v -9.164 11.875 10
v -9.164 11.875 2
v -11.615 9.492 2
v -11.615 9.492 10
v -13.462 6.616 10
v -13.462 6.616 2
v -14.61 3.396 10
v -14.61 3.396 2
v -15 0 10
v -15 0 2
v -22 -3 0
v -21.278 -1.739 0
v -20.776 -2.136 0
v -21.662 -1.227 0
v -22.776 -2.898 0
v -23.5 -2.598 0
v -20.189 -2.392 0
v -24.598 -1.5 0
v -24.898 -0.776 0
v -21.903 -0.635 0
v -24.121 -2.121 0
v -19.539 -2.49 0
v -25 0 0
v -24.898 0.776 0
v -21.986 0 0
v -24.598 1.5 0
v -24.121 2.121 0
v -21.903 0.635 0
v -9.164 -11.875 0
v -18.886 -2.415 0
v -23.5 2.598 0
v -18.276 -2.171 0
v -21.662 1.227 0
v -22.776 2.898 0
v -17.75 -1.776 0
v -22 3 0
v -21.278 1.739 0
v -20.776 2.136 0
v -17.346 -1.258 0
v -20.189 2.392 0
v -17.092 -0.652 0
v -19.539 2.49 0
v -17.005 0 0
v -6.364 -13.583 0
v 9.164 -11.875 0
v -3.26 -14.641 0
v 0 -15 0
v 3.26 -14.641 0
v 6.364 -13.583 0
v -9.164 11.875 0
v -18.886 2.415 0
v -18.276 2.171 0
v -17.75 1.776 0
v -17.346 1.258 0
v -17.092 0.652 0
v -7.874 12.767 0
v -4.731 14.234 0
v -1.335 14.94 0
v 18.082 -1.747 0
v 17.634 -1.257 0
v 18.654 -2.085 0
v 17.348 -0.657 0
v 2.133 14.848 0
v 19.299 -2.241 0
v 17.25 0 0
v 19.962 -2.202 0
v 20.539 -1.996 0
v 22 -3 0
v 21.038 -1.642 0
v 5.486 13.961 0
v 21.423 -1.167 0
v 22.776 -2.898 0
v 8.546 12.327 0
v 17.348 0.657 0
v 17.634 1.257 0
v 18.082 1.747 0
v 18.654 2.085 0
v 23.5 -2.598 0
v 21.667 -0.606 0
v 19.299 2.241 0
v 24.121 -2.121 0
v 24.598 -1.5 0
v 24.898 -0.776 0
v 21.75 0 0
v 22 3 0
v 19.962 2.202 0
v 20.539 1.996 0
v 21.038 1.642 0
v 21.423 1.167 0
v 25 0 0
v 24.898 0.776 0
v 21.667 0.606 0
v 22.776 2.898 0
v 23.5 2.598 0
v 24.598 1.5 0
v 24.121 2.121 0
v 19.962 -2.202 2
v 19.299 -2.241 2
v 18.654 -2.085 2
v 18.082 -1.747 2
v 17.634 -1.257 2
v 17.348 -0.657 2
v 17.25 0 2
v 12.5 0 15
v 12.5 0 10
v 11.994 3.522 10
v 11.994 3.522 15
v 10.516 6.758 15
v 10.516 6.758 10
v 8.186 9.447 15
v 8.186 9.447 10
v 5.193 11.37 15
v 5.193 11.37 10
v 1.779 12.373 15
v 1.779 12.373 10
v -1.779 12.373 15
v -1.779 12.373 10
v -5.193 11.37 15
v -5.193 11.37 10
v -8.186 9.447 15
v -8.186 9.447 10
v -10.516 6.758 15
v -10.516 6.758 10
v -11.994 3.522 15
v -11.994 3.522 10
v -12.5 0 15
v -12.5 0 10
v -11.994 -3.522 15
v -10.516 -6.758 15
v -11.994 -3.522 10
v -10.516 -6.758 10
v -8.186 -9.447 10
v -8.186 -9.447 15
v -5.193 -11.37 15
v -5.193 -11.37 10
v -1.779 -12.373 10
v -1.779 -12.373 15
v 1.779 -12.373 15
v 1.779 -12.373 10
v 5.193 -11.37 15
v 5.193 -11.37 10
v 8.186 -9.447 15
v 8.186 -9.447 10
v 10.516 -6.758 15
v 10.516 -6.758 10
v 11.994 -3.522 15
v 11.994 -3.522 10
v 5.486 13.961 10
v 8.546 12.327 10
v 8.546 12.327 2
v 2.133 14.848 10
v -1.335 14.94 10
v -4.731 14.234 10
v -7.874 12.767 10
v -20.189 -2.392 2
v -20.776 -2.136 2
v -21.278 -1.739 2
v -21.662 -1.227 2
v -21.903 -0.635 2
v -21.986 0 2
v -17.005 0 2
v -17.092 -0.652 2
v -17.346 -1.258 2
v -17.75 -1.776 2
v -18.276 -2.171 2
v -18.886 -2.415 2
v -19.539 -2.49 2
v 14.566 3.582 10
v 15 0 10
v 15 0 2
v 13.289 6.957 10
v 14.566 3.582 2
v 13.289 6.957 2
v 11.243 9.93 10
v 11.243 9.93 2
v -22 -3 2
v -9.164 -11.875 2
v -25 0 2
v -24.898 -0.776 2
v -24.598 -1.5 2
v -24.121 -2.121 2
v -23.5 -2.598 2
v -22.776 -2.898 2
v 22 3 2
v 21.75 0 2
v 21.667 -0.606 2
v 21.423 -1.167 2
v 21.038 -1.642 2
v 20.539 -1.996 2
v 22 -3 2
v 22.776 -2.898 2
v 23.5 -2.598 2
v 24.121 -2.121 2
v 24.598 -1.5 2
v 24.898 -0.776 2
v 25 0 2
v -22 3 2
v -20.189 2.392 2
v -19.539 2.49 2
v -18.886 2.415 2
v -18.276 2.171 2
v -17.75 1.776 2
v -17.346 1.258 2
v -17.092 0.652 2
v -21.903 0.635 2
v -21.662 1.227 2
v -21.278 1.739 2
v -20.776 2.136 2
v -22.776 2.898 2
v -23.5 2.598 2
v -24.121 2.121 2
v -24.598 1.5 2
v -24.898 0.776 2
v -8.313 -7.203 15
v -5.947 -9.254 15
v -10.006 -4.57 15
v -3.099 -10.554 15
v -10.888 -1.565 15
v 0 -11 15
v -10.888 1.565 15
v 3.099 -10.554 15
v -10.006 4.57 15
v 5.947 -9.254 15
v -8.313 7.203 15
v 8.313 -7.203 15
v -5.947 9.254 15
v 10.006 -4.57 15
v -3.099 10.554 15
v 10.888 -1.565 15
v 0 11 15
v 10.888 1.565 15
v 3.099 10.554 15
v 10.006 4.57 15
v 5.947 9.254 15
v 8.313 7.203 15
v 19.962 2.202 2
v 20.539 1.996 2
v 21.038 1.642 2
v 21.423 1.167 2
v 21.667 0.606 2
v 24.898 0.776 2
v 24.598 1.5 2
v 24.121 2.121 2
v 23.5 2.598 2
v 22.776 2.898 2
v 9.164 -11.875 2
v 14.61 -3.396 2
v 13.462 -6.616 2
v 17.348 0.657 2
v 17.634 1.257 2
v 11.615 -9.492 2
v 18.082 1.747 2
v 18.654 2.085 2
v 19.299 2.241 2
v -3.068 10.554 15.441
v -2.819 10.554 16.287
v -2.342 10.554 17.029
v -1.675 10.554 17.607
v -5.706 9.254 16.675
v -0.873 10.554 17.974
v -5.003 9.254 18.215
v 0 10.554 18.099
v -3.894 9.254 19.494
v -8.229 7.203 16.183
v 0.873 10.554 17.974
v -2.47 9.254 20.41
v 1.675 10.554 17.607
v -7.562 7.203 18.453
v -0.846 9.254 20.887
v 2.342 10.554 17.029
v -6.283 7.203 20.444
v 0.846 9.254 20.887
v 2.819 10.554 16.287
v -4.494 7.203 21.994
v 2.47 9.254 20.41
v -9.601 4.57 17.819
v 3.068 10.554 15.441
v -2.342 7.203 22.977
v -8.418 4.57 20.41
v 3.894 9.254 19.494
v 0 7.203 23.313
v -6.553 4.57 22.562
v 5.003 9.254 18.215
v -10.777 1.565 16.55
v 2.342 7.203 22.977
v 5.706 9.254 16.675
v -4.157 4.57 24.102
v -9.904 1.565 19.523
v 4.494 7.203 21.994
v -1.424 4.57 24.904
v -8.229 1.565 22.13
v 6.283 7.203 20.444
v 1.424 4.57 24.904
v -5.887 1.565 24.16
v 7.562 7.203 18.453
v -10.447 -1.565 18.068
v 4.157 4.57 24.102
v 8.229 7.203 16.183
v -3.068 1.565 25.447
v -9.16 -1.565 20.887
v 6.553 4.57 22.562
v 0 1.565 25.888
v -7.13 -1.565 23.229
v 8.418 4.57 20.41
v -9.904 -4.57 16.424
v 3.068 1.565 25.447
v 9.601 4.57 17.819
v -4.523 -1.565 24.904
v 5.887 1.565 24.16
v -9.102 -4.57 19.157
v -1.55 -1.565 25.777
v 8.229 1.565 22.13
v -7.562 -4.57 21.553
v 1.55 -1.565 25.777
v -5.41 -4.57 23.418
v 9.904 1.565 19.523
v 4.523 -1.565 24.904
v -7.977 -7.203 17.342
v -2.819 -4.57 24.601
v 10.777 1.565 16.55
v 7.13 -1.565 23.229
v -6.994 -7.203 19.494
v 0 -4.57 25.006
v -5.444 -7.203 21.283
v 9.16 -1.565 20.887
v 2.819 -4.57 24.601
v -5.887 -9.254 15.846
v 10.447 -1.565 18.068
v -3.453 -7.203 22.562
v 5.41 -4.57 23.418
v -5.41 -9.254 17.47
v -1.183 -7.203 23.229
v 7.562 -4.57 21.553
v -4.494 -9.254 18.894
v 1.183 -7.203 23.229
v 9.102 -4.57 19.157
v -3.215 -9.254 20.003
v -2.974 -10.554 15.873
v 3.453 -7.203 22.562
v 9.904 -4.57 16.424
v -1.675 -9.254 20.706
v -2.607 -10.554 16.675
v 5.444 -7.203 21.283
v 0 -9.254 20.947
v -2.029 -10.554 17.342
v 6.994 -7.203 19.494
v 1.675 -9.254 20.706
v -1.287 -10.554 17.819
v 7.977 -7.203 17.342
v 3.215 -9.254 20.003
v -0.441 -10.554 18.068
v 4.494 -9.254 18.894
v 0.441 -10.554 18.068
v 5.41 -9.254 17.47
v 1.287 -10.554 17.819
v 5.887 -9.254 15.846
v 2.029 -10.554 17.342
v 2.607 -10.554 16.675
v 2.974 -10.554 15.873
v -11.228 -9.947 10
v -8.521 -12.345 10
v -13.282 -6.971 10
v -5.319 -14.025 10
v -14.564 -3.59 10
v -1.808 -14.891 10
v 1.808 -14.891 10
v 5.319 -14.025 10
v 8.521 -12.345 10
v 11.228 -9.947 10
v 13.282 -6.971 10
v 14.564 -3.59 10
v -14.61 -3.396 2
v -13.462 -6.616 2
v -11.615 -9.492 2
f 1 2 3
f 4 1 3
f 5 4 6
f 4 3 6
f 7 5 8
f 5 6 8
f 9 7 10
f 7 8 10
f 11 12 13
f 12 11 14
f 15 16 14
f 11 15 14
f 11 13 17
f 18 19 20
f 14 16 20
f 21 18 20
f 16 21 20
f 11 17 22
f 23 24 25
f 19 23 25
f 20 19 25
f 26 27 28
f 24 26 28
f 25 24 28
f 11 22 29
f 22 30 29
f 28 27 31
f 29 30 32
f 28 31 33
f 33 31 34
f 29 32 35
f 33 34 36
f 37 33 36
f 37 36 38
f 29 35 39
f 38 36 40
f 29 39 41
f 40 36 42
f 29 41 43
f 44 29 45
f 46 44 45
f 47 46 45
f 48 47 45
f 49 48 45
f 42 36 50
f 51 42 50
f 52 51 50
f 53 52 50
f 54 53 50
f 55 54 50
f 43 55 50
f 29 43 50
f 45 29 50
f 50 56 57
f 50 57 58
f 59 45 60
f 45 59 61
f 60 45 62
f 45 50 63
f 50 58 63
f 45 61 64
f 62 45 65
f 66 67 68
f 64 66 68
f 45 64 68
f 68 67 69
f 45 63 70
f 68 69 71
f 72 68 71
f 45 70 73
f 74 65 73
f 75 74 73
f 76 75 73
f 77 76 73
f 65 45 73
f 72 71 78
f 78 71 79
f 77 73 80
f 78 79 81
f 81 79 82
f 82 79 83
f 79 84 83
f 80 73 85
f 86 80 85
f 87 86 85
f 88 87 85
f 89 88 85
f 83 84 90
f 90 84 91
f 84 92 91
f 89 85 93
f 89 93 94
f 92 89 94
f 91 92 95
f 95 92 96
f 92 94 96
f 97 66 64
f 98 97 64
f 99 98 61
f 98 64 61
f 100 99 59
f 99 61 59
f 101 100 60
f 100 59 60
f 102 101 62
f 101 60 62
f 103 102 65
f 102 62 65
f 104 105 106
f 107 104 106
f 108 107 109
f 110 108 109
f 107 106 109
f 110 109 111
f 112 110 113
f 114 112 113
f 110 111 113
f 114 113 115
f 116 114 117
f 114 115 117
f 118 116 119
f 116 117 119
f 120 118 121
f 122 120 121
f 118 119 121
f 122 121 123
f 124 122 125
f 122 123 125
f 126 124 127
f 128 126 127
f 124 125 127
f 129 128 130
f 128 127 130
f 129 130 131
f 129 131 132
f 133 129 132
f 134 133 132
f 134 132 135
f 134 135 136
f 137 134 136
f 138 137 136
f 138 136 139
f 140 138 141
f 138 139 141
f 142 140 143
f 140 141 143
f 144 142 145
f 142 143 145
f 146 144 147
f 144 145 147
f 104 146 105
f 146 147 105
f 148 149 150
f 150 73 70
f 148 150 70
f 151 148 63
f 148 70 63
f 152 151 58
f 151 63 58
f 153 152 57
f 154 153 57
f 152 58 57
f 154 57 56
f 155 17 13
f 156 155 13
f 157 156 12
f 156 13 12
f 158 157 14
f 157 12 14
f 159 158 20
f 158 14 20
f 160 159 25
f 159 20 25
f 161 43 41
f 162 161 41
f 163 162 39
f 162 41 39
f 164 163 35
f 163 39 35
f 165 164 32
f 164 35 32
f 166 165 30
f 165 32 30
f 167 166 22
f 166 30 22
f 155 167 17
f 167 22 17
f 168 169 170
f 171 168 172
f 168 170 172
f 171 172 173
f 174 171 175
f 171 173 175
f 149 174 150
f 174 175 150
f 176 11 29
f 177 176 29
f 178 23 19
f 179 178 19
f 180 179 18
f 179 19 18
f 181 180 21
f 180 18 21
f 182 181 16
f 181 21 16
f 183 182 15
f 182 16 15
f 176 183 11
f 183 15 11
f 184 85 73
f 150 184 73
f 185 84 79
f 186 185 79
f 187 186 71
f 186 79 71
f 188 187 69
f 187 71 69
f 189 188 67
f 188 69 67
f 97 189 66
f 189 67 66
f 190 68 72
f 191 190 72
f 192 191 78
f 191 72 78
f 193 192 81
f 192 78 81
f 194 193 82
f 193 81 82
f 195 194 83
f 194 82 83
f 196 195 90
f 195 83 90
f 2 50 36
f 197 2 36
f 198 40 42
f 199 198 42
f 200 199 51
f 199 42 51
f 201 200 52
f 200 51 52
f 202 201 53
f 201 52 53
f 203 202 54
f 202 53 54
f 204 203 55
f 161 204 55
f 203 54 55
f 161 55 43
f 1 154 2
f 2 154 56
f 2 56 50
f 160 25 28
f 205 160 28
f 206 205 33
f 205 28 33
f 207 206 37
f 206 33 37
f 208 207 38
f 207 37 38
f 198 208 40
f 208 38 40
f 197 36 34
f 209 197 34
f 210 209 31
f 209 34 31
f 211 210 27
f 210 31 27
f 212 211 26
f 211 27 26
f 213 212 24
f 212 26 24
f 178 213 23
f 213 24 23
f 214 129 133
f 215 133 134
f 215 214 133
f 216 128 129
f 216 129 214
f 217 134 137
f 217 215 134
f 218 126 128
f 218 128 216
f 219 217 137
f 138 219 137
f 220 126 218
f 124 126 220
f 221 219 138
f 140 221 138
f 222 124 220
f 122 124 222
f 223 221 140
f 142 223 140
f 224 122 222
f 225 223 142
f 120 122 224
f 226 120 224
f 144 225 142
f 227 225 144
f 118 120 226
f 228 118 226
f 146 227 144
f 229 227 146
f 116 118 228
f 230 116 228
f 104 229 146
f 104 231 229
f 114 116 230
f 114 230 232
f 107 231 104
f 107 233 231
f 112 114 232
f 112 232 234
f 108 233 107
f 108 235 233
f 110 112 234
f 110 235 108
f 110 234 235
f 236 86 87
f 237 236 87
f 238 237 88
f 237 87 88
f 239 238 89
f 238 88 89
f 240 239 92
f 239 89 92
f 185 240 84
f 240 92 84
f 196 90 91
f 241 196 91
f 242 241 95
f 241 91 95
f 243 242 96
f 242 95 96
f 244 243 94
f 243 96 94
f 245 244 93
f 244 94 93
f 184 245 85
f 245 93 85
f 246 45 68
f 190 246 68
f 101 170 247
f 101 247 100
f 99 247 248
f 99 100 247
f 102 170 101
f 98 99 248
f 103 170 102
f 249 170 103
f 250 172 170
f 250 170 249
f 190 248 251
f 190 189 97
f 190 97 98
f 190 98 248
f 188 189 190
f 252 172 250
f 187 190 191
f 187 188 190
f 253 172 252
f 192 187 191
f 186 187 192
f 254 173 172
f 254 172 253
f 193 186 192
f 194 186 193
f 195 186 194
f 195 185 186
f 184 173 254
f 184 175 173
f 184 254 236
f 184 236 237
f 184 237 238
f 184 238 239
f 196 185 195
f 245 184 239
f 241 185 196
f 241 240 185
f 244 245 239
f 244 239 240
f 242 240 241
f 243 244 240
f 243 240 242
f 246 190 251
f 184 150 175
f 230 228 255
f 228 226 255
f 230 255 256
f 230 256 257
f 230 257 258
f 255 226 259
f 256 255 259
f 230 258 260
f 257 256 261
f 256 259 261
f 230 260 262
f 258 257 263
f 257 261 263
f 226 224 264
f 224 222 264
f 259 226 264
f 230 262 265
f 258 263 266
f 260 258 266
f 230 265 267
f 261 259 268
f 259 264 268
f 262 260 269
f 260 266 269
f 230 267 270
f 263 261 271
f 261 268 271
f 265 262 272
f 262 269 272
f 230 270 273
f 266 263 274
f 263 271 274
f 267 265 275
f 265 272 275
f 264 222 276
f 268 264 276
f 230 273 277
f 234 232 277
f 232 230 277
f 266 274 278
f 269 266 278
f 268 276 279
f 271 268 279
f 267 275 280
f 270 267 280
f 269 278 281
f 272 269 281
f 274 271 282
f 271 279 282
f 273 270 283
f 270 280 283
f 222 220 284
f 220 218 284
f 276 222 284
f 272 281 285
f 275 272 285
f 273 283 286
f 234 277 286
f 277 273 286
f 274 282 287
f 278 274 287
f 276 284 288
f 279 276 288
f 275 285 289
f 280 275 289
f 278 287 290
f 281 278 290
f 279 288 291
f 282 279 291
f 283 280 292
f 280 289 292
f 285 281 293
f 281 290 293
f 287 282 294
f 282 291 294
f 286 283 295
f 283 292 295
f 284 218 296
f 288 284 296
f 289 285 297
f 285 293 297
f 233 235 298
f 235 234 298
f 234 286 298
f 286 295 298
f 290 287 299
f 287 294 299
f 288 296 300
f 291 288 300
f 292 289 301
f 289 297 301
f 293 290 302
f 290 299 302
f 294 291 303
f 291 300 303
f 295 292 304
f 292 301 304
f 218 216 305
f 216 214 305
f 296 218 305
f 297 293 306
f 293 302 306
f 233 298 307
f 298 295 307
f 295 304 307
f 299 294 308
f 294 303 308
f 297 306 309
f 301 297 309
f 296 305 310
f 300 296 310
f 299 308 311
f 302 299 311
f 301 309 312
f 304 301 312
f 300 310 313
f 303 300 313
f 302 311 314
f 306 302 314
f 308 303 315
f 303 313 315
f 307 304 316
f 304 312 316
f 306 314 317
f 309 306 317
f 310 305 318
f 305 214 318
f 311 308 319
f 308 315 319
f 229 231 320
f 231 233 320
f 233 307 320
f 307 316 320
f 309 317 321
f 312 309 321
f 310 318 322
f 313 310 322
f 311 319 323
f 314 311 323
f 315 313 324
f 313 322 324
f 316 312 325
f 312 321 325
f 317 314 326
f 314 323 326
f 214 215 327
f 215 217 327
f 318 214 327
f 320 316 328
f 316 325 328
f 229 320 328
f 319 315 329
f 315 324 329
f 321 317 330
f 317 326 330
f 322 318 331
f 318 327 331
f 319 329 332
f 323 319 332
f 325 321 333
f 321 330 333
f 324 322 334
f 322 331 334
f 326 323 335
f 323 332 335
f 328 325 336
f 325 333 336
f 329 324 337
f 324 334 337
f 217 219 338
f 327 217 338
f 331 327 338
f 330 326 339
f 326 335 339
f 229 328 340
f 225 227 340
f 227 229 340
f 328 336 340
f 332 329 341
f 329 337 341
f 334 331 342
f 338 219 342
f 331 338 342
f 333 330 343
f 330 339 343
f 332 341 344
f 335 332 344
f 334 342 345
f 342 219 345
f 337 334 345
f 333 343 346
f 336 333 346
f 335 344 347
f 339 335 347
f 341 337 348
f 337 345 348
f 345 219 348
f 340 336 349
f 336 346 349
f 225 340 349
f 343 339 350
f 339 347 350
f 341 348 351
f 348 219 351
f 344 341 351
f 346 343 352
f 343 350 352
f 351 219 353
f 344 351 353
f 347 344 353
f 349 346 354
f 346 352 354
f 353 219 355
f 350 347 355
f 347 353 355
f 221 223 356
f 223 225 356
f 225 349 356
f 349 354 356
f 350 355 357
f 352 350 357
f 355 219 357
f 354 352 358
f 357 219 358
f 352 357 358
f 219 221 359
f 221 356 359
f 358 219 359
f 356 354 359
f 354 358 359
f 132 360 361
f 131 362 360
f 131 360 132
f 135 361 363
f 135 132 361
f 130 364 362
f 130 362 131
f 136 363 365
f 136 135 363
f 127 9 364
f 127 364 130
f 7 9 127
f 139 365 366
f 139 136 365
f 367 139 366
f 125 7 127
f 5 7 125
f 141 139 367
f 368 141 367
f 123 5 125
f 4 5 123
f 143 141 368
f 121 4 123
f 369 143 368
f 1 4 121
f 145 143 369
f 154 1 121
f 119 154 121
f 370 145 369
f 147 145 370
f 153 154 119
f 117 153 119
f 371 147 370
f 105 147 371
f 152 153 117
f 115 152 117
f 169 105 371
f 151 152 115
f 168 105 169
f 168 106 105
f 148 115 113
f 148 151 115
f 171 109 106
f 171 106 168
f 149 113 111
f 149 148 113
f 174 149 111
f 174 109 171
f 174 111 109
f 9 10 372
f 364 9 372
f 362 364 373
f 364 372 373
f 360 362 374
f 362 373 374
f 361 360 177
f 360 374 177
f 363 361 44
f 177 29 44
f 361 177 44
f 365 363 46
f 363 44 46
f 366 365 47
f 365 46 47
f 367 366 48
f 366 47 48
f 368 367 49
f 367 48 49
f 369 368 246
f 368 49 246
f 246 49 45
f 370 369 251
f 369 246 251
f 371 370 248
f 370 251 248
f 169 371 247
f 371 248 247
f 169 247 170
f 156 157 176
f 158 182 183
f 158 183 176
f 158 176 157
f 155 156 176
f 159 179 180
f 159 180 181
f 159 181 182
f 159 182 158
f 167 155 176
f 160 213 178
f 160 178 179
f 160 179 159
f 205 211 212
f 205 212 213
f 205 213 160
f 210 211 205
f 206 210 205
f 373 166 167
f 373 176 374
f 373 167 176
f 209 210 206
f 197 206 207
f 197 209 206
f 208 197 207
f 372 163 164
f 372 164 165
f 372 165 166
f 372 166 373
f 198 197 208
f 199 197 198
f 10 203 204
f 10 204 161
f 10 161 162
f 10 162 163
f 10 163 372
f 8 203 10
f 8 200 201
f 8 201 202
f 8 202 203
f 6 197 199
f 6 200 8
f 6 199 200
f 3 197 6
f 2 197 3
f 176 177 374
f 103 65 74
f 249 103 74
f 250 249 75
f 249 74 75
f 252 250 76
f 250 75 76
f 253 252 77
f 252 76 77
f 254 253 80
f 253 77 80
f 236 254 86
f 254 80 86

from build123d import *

# Parameters (mm, degrees)
F2_DEPTH = 10
F3_R     = 12.5
F4_DEPTH = 5
F7_DEPTH = 2


with BuildPart() as f2:
    # F1 (on face) → F2 (new body)
    with BuildSketch(Plane.XY):
        with BuildLine():
            Line((0, 0), (15, 0))
            ThreePointArc((15, 0), (13.2889854694, 6.9572167707), (8.5462846407, 12.3272470098))
            ThreePointArc((8.5462846407, 12.3272470098), (0.4015789928, 14.9946235135), (-7.8742218987, 12.7670133348))
            Line((-7.8742218987, 12.7670133348), (-9.1641377572, 11.8751243853))
            ThreePointArc((-9.1641377572, 11.8751243853), (-13.4622075894, 6.6158118792), (-15, 0))
            Line((-15, 0), (0, 0))
        make_face()
        with BuildLine():
            ThreePointArc((-15, 0), (0, -15), (15, 0))
            Line((15, 0), (0, 0))
            Line((0, 0), (-15, 0))
        make_face()
    extrude(amount=F2_DEPTH)

    # F3 (on face) → F4 (join)
    with BuildSketch(Plane.XY.offset(10)):
        Circle(F3_R)
    extrude(amount=F4_DEPTH)

    # F5 (on face) → F6 (revolve)
    with BuildSketch(Plane.XY.offset(15)):
        with BuildLine():
            Line((0, -11), (0, 11))
            ThreePointArc((0, 11), (-11, 0), (0, -11))
        make_face()
    revolve(axis=Axis((0, 0, 15), (0, 1, 0)))

    # F0 (on Top) → F7 (join)
    with BuildSketch(Plane.XY):
        with BuildLine():
            ThreePointArc((-9.1641377572, -11.8751243853), (-13.4622075894, -6.6158118792), (-15, 0))
            Line((-15, 0), (-17.0049901825, 0))
            ThreePointArc((-17.0049901825, 0), (-17.9996312672, -1.9911334725), (-20.1890252755, -2.3917296142))
            ThreePointArc((-20.1890252755, -2.3917296142), (-21.0448007649, -2.843869621), (-22, -3))
            Line((-22, -3), (-9.1641377572, -11.8751243853))
        make_face()
        with BuildLine():
            Line((17.25, 0), (15, 0))
            ThreePointArc((15, 0), (13.4622075894, -6.6158118792), (9.1641377572, -11.8751243853))
            Line((9.1641377572, -11.8751243853), (22, -3))
            ThreePointArc((22, -3), (20.9058923217, -2.7933722251), (19.9625, -2.2019522588))
            ThreePointArc((19.9625, -2.2019522588), (18.0819247199, -1.7468722048), (17.25, 0))
        make_face()
        with BuildLine():
            ThreePointArc((21.75, 0), (21.2468722048, -1.4180752801), (19.9625, -2.2019522588))
            ThreePointArc((19.9625, -2.2019522588), (20.9058923217, -2.7933722251), (22, -3))
            ThreePointArc((22, -3), (24.1213203436, -2.1213203436), (25, 0))
            Line((25, 0), (22, 0))
            Line((22, 0), (21.75, 0))
        make_face()
        with BuildLine():
            ThreePointArc((8.5462846407, 12.3272470098), (13.2889854694, 6.9572167707), (15, 0))
            Line((15, 0), (17.25, 0))
            ThreePointArc((17.25, 0), (18.0819247199, 1.7468722048), (19.9625, 2.2019522588))
            ThreePointArc((19.9625, 2.2019522588), (20.9058923217, 2.7933722251), (22, 3))
            Line((22, 3), (8.5462846407, 12.3272470098))
        make_face()
        with BuildLine():
            ThreePointArc((22, 3), (20.9058923217, 2.7933722251), (19.9625, 2.2019522588))
            ThreePointArc((19.9625, 2.2019522588), (21.2468722048, 1.4180752801), (21.75, 0))
            Line((21.75, 0), (22, 0))
            Line((22, 0), (25, 0))
            ThreePointArc((25, 0), (24.1213203436, 2.1213203436), (22, 3))
        make_face()
        with BuildLine():
            Line((-17.0049901825, 0), (-15, 0))
            ThreePointArc((-15, 0), (-13.4622075894, 6.6158118792), (-9.1641377572, 11.8751243853))
            Line((-9.1641377572, 11.8751243853), (-22, 3))
            ThreePointArc((-22, 3), (-21.0448007649, 2.843869621), (-20.1890252755, 2.3917296142))
            ThreePointArc((-20.1890252755, 2.3917296142), (-17.9996312672, 1.9911334725), (-17.0049901825, 0))
        make_face()
        with BuildLine():
            ThreePointArc((-21.9856042642, 0), (-21.4864306958, 1.4956659562), (-20.1890252755, 2.3917296142))
            ThreePointArc((-20.1890252755, 2.3917296142), (-21.0448007649, 2.843869621), (-22, 3))
            ThreePointArc((-22, 3), (-24.1213203436, 2.1213203436), (-25, 0))
            Line((-25, 0), (-22, 0))
            Line((-22, 0), (-21.9856042642, 0))
        make_face()
        with BuildLine():
            ThreePointArc((-22, -3), (-21.0448007649, -2.843869621), (-20.1890252755, -2.3917296142))
            ThreePointArc((-20.1890252755, -2.3917296142), (-21.4864306958, -1.4956659562), (-21.9856042642, 0))
            Line((-21.9856042642, 0), (-22, 0))
            Line((-22, 0), (-25, 0))
            ThreePointArc((-25, 0), (-24.1213203436, -2.1213203436), (-22, -3))
        make_face()
    extrude(amount=F7_DEPTH)


solid = f2.part
